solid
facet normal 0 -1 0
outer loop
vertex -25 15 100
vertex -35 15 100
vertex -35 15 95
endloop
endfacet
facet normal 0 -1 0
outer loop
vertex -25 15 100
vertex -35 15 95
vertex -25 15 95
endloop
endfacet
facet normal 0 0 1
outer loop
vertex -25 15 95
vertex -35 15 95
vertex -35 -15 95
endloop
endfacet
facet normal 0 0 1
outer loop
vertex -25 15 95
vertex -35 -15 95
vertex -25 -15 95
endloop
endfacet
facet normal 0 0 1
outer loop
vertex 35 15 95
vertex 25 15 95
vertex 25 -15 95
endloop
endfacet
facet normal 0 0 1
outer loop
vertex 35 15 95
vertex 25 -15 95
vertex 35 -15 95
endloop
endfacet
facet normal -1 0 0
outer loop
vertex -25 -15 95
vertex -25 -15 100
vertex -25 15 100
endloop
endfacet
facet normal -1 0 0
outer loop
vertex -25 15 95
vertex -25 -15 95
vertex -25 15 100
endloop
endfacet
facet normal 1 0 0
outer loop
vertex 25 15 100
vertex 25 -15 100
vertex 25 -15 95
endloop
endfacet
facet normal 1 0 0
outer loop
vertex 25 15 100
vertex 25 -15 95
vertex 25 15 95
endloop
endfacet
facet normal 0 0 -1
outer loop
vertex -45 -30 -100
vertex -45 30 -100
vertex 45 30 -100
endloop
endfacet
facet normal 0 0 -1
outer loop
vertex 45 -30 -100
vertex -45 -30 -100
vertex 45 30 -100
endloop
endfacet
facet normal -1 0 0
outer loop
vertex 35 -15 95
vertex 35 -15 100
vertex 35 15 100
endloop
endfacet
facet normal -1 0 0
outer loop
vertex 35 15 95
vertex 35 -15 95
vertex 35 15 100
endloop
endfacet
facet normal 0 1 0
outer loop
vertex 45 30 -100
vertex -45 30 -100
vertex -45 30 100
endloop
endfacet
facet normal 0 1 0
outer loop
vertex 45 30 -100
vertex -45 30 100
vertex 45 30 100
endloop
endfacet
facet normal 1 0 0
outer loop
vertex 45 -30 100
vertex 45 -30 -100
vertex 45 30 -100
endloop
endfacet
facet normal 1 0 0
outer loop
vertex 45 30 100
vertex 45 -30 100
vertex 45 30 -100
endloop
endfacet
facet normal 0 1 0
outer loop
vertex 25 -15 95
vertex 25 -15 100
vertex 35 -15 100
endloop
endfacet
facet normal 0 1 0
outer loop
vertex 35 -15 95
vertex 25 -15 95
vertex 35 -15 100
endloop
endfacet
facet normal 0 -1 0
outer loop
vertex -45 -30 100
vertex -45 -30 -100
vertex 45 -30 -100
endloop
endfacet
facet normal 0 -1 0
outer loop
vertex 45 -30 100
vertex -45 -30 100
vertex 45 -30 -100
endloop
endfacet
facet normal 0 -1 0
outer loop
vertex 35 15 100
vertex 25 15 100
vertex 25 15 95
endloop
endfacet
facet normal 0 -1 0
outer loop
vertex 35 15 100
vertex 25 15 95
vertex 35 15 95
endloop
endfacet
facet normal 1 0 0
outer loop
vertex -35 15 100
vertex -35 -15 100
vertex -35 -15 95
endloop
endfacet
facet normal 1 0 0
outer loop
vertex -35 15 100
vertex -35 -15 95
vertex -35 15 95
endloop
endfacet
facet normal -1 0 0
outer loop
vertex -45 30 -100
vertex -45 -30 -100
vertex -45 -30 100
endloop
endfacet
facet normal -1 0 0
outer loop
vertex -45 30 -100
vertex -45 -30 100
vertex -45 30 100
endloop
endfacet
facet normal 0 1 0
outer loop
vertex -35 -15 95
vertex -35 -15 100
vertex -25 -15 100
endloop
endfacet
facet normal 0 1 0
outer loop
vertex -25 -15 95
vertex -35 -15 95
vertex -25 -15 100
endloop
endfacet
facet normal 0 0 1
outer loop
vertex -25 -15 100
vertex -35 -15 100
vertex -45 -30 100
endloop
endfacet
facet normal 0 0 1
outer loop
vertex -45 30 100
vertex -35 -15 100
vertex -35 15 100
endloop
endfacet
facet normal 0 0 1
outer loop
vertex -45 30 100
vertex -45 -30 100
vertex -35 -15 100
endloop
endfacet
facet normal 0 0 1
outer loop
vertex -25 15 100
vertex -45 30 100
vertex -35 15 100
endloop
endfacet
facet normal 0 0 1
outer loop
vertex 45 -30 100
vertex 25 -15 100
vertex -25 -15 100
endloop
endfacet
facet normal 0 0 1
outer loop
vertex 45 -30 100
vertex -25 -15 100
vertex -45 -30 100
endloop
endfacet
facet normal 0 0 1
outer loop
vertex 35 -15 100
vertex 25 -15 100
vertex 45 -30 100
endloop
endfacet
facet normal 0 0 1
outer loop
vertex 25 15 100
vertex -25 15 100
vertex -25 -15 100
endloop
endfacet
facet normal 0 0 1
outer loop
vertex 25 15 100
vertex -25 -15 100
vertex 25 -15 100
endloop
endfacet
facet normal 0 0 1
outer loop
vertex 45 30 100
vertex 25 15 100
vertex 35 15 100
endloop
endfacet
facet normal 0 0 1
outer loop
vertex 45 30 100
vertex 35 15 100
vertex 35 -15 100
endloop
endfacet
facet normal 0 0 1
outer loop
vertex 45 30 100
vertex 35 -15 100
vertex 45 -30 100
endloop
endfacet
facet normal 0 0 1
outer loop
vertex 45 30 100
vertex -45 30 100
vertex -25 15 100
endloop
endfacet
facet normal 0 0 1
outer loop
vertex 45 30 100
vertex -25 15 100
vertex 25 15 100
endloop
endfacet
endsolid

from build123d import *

# Parameters (mm, degrees)
SKETCH_1_W          = 90
SKETCH_1_H          = 60
EXTRUDE_1_DEPTH     = 100
SKETCH_2_W          = 10
SKETCH_2_H          = 30
CUT_EXTRUDE_1_DEPTH = 5


with BuildPart() as part:
    # Эскиз1 → Бобышка-Вытянуть1 (new, symmetric)
    with BuildSketch(Plane.XY):
        Rectangle(SKETCH_1_W, SKETCH_1_H)
    extrude(amount=EXTRUDE_1_DEPTH, both=True)

    # Эскиз2 → Вырез-Вытянуть1 (cut)
    with BuildSketch(Plane.XY.offset(100)):
        with Locations((-30, 0)):
            Rectangle(SKETCH_2_W, SKETCH_2_H)
        with Locations((30, 0)):
            Rectangle(SKETCH_2_W, SKETCH_2_H)
    extrude(amount=-CUT_EXTRUDE_1_DEPTH, mode=Mode.SUBTRACT)


solid = part.part
